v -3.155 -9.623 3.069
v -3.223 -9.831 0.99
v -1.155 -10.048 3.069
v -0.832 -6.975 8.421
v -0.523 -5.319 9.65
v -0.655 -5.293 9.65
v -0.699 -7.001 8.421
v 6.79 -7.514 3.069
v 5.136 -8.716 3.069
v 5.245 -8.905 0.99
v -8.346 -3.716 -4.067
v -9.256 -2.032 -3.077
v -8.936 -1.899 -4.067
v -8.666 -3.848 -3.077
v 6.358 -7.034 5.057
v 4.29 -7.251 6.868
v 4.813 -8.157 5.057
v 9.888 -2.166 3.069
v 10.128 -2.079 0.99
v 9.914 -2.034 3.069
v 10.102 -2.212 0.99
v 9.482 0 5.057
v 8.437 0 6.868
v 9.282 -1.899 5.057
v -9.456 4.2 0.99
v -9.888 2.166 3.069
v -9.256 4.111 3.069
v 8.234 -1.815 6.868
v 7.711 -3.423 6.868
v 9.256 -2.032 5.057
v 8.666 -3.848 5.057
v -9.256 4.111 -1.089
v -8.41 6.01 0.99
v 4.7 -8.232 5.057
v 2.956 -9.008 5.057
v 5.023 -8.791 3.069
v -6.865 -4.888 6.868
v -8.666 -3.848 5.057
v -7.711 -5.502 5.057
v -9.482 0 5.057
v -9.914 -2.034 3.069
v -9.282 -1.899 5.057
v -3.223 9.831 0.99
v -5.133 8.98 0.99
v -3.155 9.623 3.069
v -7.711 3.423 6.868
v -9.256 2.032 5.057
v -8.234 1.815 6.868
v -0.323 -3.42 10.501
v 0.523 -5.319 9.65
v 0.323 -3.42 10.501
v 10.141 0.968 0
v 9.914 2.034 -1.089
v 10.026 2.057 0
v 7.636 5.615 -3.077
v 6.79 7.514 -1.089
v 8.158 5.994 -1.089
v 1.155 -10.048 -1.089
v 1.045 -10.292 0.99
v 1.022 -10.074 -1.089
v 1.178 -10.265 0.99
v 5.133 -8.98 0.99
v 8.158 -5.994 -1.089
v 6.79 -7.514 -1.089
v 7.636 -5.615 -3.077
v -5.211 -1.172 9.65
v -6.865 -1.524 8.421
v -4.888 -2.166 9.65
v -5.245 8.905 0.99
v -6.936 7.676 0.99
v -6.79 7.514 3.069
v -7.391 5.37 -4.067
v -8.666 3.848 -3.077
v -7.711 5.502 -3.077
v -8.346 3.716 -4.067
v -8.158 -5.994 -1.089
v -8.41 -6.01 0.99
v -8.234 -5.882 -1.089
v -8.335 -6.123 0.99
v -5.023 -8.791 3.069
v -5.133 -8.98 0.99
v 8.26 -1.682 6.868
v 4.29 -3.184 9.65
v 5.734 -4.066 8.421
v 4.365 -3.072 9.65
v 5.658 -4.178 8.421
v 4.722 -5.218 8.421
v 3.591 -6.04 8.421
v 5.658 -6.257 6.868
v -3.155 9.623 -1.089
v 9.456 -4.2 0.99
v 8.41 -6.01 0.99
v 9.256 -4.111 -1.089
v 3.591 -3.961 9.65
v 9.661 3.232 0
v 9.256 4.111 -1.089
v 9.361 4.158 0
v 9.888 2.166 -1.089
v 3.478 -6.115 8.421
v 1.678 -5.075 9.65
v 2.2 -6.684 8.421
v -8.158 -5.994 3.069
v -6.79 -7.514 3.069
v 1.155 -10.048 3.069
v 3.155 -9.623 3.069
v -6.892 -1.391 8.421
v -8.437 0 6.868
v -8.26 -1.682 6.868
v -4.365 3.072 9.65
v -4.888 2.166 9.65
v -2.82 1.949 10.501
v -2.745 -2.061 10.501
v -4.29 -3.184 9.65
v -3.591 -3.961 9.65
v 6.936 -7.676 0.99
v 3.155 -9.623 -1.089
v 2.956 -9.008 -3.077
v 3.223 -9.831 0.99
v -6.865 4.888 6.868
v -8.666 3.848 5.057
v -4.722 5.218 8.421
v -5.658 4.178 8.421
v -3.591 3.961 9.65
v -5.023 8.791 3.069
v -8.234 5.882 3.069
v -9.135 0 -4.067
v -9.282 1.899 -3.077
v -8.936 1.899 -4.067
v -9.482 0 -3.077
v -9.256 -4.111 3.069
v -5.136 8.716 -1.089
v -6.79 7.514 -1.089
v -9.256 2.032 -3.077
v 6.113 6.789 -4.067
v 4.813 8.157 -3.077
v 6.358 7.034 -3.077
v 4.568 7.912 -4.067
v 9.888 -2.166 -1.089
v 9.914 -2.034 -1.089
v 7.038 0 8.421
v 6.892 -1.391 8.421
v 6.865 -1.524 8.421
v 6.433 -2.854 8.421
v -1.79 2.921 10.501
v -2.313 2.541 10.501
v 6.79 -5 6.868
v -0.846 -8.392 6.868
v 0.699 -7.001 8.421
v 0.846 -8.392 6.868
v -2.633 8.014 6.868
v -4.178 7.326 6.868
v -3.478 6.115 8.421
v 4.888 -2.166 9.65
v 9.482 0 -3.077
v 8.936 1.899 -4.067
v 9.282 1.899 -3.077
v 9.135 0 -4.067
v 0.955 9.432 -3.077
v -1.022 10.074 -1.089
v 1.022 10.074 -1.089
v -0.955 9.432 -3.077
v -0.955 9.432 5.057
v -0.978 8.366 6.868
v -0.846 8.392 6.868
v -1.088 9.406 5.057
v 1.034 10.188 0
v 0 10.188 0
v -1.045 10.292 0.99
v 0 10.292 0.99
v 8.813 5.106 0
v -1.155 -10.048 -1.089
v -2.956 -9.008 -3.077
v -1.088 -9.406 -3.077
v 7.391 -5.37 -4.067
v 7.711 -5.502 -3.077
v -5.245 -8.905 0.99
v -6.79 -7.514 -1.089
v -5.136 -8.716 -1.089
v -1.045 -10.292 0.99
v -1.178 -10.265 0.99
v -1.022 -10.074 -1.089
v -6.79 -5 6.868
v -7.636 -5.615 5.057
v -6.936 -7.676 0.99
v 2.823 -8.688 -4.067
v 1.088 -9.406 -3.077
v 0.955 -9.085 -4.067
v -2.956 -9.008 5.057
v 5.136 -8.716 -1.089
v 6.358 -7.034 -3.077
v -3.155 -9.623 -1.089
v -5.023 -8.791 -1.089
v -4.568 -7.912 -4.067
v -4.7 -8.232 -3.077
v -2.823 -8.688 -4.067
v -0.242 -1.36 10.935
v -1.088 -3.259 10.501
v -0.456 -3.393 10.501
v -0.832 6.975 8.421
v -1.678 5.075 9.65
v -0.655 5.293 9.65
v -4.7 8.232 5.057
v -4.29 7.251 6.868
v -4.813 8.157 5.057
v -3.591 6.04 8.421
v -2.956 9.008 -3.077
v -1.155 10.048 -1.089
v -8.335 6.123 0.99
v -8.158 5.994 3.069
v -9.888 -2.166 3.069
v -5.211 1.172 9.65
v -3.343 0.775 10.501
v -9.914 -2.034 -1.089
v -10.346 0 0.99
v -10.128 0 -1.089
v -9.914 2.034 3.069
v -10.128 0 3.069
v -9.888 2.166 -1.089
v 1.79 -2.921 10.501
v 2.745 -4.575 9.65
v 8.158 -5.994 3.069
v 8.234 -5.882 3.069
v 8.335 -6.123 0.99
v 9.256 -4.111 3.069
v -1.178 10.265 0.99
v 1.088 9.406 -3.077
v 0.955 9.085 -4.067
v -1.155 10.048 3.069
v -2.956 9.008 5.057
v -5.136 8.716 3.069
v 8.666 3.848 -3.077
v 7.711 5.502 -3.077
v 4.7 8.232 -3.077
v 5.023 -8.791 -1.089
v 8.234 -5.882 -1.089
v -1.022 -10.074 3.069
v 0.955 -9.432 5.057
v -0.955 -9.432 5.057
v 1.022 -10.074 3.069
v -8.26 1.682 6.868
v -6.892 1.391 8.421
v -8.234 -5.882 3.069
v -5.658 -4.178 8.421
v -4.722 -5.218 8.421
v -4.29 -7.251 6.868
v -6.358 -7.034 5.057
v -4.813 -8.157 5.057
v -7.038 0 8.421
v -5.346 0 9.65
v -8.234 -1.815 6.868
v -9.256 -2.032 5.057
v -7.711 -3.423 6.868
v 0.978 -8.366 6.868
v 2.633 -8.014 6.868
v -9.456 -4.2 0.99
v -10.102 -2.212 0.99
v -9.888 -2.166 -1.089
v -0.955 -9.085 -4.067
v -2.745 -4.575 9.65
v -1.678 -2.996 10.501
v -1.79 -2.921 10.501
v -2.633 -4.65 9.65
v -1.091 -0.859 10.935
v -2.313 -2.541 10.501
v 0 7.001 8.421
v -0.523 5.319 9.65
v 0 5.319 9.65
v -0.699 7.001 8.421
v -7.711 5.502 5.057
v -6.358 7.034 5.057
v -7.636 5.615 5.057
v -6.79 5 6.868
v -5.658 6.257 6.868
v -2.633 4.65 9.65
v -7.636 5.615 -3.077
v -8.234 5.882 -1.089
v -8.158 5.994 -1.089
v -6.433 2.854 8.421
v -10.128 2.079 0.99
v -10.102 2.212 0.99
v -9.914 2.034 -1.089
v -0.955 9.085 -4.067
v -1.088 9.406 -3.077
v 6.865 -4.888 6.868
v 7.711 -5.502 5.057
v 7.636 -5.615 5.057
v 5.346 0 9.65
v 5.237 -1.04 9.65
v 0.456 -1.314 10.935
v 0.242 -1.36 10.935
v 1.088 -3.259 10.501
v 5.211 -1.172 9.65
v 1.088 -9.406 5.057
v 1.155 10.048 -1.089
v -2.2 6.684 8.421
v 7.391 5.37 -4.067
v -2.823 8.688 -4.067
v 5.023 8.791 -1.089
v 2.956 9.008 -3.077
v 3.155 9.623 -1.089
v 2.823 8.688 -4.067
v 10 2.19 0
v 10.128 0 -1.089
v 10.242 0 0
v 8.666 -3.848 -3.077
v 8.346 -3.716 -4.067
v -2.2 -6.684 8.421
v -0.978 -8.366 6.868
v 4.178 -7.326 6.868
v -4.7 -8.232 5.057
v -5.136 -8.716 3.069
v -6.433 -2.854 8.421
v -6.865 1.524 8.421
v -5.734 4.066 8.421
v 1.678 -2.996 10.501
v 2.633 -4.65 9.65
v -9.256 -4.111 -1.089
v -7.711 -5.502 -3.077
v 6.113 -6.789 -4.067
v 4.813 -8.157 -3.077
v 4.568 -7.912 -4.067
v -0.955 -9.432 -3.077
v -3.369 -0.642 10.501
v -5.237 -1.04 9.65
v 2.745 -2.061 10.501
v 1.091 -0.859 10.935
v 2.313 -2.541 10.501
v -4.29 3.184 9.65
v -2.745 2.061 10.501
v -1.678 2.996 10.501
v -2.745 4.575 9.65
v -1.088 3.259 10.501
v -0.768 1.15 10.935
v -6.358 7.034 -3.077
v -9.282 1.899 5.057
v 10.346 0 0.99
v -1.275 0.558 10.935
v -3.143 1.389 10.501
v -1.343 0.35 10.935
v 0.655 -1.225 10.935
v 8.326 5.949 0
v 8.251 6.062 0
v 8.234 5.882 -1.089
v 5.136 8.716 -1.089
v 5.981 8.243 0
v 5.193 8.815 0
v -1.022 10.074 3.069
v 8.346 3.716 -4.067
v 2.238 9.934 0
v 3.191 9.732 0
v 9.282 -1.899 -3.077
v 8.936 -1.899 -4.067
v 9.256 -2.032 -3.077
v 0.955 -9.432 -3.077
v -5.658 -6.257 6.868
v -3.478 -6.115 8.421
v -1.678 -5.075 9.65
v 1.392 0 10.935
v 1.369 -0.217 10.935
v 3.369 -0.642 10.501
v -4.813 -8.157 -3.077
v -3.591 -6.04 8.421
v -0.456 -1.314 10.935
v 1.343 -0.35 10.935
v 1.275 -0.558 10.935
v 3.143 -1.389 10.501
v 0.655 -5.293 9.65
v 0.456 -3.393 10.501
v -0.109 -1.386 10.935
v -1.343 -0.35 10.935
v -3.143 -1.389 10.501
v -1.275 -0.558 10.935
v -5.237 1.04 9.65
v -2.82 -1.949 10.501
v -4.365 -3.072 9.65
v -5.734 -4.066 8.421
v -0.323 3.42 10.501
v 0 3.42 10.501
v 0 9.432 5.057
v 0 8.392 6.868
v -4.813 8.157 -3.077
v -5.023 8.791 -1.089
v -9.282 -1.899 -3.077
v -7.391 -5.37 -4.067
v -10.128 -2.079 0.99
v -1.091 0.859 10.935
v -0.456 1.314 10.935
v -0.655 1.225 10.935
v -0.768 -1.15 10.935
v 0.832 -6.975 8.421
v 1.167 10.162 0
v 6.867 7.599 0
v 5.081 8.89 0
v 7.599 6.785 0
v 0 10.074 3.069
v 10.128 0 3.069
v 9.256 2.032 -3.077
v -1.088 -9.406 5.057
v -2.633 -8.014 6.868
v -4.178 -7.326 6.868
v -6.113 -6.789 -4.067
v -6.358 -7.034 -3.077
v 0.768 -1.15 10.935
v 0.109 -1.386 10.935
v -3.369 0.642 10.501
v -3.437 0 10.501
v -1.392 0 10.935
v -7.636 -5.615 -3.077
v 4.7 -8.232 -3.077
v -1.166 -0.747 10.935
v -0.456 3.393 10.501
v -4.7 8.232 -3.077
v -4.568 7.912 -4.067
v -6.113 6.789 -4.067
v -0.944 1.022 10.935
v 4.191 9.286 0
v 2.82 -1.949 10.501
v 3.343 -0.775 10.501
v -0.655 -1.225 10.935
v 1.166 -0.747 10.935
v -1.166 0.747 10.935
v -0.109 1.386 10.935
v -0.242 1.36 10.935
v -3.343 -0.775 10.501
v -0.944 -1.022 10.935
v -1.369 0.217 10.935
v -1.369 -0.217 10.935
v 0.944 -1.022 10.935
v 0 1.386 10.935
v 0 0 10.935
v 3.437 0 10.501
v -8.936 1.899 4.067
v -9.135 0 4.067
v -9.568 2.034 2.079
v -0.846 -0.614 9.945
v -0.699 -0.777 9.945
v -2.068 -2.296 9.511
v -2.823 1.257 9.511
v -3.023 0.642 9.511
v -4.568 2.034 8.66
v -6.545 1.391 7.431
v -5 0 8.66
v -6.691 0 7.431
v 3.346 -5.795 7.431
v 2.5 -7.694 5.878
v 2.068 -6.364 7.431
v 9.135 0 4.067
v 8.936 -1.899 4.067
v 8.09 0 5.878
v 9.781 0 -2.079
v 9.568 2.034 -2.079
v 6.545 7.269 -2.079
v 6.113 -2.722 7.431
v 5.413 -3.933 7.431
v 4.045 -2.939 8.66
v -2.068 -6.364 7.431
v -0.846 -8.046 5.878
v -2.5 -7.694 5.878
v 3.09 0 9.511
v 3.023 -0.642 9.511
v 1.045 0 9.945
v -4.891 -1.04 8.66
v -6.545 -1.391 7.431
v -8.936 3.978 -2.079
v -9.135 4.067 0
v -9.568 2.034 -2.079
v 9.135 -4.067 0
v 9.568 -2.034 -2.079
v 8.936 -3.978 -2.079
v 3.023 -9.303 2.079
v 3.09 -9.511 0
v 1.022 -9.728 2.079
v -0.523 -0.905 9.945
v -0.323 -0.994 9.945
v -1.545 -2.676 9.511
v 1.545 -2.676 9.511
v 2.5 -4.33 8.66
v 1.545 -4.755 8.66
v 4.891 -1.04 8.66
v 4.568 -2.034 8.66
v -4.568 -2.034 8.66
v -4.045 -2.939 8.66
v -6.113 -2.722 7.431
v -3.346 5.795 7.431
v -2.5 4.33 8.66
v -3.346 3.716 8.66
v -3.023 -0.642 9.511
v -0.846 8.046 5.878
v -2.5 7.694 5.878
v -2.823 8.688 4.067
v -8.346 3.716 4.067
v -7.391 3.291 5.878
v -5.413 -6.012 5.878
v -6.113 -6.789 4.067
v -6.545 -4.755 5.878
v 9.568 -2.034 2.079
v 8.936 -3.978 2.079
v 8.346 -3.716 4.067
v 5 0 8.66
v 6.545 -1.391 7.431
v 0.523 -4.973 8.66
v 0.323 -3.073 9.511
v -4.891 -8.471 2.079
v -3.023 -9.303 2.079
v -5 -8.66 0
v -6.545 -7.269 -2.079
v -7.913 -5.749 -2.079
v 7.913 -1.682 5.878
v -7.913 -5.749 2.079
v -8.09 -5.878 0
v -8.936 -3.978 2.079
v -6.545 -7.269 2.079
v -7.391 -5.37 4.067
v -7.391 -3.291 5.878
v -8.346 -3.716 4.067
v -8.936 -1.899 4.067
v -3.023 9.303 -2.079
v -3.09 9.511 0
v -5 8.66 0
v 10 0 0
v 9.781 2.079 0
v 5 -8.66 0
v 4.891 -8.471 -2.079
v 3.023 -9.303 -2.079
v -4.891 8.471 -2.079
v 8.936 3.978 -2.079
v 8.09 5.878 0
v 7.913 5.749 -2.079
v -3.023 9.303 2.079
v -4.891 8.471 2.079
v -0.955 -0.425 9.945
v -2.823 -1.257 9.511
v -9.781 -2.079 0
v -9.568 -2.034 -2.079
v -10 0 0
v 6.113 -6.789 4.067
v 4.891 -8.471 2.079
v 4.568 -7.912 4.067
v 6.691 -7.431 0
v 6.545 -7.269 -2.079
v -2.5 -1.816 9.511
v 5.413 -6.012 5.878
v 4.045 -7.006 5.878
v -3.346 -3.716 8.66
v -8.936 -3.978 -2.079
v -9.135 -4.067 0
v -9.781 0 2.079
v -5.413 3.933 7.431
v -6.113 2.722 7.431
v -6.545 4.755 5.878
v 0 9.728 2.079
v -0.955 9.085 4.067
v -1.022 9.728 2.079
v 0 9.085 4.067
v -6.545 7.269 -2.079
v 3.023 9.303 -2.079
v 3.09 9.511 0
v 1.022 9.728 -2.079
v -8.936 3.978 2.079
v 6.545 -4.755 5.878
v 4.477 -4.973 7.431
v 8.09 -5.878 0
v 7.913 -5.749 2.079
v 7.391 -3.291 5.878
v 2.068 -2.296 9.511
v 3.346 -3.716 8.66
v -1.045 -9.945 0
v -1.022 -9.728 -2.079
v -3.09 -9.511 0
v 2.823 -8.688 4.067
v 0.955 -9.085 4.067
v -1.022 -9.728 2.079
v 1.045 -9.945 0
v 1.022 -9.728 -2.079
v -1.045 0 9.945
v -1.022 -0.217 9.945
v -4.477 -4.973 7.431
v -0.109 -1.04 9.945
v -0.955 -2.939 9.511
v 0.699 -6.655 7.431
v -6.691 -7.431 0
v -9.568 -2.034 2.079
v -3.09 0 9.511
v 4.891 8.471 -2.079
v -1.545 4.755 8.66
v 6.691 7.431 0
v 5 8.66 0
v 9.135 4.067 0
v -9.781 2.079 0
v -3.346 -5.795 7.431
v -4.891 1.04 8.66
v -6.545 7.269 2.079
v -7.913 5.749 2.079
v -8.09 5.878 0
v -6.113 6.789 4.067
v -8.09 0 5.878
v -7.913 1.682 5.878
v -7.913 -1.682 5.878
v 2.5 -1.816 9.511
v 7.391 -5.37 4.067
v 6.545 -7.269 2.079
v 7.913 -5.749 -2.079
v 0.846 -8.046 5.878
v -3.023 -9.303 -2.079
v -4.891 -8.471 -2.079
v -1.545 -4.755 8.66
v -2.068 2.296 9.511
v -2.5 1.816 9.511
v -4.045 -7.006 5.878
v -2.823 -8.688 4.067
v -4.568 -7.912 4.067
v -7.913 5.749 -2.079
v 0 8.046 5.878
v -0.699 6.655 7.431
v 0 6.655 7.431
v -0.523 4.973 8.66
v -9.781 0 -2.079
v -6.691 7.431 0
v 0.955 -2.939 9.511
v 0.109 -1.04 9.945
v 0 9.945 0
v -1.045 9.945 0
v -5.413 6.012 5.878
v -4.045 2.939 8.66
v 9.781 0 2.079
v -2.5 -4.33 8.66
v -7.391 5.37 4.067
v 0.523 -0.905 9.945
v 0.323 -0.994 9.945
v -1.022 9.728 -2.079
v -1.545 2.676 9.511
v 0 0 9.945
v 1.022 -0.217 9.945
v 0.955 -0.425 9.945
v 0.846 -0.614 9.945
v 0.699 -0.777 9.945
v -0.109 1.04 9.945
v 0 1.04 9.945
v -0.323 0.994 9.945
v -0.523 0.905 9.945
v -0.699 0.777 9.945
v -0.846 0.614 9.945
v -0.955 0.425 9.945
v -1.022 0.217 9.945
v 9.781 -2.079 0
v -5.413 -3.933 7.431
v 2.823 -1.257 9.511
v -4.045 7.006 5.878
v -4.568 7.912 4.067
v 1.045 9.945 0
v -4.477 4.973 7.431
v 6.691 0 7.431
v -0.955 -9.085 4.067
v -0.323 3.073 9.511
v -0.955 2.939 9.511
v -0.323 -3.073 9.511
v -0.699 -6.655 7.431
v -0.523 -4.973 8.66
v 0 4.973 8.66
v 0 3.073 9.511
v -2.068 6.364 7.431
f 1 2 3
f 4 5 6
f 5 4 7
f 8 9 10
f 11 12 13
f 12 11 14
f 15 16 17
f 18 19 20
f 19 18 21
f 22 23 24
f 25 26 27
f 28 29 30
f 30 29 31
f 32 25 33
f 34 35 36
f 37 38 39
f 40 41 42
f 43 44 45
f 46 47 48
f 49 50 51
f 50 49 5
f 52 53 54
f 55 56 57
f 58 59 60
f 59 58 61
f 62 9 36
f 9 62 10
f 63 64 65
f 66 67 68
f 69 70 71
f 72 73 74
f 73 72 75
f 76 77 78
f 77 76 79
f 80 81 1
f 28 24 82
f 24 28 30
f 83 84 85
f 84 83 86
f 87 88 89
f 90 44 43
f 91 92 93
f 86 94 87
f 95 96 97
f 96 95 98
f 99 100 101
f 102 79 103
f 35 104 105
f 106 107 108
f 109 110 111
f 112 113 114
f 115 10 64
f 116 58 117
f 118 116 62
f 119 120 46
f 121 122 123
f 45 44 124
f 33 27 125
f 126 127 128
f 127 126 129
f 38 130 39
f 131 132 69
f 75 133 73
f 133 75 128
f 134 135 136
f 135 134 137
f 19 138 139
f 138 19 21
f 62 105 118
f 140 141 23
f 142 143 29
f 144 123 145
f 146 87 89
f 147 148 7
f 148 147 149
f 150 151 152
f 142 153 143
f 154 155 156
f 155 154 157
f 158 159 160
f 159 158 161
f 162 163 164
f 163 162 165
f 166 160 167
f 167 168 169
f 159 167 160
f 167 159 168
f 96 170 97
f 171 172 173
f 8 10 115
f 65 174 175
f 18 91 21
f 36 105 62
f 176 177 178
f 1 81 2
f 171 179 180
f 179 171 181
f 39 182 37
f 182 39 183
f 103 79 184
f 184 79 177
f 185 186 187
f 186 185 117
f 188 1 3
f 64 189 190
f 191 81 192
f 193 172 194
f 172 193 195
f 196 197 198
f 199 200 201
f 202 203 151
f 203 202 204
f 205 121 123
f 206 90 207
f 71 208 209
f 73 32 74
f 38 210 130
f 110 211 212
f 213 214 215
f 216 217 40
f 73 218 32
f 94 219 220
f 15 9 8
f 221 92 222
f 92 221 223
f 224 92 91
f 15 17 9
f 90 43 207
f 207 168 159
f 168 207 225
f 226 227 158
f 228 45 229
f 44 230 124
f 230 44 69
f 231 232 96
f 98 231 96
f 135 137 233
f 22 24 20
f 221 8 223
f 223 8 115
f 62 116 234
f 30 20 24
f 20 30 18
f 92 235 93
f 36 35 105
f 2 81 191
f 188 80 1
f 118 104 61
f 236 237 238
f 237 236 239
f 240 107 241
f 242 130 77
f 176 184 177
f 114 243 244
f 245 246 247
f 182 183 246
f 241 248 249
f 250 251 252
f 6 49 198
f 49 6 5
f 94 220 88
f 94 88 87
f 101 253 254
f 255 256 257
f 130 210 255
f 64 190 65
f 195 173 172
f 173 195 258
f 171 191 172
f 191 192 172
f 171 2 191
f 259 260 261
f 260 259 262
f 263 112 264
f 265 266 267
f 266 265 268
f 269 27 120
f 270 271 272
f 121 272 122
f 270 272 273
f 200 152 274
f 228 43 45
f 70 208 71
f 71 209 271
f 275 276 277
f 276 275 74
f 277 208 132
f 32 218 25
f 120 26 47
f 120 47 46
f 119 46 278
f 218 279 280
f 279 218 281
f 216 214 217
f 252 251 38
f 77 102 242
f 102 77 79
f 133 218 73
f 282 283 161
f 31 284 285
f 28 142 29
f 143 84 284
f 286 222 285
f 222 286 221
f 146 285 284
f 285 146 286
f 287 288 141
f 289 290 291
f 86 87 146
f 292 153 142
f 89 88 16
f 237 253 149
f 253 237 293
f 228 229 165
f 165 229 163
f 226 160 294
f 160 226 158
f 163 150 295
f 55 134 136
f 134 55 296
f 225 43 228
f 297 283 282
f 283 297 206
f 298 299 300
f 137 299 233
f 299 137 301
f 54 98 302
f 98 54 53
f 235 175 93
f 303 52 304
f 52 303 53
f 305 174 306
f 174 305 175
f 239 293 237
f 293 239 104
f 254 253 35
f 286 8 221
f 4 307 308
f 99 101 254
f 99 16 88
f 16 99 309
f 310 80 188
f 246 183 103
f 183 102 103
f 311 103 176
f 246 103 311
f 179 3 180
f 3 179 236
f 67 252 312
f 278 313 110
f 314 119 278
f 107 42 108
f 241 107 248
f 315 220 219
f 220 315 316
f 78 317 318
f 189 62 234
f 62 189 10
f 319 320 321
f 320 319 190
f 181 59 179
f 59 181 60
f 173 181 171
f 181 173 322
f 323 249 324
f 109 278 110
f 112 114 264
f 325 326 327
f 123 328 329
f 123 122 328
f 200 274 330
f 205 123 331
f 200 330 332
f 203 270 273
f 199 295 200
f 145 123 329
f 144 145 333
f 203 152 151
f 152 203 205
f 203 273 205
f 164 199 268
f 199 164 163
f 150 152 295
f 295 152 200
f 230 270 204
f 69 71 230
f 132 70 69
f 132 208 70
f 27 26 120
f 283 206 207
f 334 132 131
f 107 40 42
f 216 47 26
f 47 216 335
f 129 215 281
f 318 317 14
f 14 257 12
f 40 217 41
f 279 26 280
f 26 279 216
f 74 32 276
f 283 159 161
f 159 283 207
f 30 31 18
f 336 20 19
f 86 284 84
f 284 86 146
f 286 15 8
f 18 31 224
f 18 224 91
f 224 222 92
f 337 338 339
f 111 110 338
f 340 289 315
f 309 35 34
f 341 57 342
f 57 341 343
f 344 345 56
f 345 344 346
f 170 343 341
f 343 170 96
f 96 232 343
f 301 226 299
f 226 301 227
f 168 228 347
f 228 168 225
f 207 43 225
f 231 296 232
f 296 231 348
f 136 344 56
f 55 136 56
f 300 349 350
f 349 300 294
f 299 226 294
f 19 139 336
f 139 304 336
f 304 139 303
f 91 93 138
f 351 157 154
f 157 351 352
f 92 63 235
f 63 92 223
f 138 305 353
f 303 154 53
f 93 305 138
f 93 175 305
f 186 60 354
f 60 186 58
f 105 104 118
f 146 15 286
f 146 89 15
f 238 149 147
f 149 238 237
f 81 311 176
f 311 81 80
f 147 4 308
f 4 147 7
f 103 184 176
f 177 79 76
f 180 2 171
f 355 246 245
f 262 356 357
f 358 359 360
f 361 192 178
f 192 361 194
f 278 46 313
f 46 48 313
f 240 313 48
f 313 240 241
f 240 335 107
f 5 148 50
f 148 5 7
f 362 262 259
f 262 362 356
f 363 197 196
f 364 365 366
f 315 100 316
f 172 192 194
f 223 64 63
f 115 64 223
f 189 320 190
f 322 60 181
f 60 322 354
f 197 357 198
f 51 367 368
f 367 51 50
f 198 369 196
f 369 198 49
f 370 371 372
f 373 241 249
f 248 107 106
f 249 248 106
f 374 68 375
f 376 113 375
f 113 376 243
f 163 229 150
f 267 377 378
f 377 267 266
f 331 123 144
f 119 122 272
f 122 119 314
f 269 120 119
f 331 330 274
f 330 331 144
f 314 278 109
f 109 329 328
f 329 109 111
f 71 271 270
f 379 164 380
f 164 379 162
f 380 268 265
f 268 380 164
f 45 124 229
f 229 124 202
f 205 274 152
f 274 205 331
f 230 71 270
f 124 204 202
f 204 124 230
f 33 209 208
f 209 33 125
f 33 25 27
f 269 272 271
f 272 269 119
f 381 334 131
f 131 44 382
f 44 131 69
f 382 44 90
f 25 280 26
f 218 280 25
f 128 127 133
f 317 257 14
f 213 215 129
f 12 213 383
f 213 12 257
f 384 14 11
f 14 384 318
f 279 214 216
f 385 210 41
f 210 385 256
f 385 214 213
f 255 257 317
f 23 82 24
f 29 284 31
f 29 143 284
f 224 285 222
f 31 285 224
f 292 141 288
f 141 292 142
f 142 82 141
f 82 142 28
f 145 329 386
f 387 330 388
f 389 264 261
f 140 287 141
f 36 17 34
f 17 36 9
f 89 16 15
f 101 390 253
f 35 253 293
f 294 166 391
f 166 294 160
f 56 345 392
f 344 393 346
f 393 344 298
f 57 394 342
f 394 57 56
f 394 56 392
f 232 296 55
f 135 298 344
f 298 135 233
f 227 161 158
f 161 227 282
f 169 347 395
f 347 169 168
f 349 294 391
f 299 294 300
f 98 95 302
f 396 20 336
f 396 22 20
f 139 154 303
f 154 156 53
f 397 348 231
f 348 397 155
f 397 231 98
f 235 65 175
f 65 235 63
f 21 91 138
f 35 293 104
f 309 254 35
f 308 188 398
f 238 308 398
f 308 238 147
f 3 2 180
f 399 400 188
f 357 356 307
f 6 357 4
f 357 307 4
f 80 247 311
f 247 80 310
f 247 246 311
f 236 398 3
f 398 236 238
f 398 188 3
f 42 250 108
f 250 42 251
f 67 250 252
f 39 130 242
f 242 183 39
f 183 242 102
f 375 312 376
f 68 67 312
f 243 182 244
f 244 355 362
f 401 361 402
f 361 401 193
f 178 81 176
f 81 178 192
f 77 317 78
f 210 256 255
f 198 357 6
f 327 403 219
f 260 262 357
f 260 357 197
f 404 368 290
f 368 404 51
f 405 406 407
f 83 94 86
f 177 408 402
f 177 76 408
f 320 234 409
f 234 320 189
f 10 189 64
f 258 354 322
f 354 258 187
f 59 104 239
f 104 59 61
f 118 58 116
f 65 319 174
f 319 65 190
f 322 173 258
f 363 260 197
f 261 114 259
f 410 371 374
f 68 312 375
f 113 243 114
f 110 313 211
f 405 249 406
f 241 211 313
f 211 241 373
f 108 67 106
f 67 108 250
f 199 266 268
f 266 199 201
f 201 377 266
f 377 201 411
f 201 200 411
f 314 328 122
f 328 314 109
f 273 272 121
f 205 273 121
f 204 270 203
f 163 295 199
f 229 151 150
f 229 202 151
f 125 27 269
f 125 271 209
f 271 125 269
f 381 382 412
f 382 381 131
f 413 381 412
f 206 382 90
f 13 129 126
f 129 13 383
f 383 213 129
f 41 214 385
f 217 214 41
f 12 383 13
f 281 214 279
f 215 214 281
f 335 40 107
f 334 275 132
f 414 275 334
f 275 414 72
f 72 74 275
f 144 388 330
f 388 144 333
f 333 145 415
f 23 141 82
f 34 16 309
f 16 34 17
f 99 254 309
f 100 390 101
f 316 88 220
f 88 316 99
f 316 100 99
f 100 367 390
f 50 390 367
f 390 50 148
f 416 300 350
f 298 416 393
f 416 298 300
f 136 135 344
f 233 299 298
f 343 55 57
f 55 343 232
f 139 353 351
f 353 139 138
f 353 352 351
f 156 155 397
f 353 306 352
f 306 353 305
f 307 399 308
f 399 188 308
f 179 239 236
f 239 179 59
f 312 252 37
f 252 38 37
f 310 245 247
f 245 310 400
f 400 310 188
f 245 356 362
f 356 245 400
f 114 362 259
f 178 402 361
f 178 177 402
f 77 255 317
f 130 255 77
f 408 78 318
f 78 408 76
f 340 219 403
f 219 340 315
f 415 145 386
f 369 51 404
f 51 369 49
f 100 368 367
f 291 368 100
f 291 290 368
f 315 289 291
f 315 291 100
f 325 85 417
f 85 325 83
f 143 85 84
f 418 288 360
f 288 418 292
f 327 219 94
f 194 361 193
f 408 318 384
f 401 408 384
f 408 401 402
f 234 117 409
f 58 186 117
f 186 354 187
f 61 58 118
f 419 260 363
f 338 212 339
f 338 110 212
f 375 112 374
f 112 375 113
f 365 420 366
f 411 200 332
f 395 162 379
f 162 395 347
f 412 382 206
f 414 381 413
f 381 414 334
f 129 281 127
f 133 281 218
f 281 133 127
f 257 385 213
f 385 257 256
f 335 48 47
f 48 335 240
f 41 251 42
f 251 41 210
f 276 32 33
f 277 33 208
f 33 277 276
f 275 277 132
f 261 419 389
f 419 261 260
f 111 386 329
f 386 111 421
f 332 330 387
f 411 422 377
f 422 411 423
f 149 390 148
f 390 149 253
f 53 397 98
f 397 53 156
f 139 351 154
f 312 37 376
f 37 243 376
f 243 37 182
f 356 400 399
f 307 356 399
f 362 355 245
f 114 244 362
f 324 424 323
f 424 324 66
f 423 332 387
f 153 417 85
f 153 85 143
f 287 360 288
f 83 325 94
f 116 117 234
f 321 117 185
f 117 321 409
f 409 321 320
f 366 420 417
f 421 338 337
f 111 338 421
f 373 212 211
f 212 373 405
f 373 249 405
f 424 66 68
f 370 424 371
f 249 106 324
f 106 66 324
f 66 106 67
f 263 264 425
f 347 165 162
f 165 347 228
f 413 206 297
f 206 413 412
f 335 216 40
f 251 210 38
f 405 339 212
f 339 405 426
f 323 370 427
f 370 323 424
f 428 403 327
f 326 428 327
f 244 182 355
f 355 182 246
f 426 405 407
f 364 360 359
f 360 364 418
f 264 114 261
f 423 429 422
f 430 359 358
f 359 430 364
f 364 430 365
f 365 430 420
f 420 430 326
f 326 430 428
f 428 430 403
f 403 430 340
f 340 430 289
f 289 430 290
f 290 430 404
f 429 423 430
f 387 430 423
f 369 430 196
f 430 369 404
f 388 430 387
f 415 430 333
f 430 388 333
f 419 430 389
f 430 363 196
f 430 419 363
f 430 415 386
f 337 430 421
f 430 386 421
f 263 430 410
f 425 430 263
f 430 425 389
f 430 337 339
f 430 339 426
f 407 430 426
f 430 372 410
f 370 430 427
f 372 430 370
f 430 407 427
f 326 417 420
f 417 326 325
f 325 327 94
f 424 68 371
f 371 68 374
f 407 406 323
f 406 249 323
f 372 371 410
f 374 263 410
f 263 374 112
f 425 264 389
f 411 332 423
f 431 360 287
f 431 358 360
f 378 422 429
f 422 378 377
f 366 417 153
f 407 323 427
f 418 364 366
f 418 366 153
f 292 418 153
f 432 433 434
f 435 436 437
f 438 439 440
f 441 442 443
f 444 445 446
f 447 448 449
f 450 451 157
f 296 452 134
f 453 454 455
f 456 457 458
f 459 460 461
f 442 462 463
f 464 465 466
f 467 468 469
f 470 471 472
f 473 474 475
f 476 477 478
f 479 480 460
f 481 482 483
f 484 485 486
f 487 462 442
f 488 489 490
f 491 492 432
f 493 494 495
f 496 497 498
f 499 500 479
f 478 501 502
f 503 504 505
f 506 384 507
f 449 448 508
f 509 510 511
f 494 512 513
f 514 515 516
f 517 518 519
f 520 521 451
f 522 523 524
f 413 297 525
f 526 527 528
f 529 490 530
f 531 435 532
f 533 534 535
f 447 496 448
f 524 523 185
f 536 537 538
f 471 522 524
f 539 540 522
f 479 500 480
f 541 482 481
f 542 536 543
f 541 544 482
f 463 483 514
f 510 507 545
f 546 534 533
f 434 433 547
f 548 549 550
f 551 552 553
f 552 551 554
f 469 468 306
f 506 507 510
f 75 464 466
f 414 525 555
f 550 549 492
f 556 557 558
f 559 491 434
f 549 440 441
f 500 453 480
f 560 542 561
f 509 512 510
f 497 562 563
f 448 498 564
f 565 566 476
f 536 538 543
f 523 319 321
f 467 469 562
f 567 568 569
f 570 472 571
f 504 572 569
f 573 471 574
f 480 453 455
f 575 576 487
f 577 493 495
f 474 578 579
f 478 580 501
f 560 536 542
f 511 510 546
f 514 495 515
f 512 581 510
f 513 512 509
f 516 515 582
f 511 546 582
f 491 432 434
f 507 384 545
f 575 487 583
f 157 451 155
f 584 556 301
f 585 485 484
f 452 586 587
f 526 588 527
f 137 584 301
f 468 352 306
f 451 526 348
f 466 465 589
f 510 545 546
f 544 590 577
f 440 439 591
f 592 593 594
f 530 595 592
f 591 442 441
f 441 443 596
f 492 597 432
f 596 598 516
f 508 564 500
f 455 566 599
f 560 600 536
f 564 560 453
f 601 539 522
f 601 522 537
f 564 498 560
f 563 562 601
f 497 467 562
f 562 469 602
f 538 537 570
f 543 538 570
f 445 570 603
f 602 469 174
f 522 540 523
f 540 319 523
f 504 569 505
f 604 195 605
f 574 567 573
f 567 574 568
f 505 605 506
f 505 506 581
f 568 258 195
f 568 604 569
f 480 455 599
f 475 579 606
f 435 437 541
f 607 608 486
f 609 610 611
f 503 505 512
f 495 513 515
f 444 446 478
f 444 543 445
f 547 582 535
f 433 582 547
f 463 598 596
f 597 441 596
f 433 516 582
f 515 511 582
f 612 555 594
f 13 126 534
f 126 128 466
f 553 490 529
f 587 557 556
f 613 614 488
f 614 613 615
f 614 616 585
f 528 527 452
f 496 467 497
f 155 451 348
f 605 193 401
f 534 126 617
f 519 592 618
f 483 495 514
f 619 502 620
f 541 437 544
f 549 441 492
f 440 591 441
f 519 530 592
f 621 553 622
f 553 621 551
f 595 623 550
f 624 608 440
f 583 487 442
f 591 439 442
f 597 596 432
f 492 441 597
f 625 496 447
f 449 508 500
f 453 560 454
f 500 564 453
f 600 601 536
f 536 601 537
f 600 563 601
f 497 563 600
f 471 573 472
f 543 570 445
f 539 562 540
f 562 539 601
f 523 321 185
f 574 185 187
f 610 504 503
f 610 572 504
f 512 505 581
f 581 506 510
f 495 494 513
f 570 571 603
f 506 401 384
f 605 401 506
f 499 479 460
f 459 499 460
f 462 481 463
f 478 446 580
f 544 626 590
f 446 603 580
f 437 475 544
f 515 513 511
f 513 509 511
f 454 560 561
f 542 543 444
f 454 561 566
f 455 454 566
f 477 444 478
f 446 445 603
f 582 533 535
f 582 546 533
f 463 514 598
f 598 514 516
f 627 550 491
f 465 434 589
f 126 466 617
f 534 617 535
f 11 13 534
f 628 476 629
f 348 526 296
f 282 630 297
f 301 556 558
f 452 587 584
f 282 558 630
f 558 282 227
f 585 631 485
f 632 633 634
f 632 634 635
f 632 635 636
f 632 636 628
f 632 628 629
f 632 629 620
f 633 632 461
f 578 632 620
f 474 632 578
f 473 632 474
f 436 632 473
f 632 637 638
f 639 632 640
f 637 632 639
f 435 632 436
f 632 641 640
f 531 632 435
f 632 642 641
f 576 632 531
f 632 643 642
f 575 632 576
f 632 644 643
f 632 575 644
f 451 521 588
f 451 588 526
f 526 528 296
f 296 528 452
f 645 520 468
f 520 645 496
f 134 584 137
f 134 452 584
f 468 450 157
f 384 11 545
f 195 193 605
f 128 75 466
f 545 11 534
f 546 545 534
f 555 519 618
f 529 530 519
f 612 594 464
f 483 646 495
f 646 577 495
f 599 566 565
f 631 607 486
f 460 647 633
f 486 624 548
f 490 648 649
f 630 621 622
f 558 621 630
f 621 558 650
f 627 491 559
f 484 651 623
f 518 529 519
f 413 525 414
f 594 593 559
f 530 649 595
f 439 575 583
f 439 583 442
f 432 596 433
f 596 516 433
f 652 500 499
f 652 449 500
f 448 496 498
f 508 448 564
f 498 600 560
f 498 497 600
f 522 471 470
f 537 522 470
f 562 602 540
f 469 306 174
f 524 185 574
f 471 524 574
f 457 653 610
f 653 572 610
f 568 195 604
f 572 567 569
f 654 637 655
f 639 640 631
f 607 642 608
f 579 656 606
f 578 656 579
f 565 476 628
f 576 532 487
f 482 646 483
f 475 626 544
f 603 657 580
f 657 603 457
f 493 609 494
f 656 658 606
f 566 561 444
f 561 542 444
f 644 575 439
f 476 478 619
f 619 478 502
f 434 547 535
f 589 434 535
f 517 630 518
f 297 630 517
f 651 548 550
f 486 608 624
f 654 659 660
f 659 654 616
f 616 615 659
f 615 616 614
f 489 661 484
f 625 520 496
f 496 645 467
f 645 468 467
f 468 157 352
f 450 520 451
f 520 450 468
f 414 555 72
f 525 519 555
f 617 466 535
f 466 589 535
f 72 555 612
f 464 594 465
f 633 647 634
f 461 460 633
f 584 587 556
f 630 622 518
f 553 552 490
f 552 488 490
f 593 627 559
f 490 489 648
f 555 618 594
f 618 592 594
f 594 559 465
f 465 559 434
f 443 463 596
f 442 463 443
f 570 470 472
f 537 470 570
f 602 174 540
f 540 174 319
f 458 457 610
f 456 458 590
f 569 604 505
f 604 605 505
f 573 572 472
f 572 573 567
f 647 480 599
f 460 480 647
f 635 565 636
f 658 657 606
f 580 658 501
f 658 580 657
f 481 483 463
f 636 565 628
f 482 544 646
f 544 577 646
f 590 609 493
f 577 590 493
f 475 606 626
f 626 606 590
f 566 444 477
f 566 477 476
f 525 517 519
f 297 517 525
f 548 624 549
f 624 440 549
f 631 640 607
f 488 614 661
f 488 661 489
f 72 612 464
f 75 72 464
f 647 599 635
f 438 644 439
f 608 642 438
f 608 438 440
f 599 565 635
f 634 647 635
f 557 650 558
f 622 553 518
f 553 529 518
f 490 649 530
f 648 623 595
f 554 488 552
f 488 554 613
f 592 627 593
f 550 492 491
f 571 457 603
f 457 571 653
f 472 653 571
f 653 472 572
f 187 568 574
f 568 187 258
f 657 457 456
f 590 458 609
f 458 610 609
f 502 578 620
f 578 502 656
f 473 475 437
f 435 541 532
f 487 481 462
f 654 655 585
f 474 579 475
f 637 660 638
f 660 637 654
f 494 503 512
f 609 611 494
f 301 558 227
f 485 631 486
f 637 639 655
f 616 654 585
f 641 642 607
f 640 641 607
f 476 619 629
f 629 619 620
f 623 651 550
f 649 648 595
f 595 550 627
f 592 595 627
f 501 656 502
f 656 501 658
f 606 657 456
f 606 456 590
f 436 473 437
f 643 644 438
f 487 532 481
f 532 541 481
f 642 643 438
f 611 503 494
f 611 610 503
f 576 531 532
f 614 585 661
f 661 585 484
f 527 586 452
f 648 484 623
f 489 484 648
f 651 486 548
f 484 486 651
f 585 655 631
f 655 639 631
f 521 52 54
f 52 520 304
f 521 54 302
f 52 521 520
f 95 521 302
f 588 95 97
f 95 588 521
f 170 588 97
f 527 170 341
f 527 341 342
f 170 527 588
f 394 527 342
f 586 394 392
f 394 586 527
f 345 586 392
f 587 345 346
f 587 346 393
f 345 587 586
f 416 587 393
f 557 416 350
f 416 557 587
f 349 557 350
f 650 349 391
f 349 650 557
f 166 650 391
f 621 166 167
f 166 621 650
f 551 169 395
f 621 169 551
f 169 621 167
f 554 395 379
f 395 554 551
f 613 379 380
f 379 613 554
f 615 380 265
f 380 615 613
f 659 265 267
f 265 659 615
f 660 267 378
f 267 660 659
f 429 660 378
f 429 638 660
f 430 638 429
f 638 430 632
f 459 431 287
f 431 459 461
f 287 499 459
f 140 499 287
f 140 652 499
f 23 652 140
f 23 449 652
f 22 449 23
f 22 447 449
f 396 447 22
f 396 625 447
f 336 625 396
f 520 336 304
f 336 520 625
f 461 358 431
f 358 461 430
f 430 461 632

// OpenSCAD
// Directed Minkowski Modules

render_test="test bulge_cube";
render_test="test bulge_cone";

module bulge_cube(h,scale_xy=0.1,theta=0,phi=0,dr=0) {
    intersection() {
        for(i=[0:1],j=[0:1]) {
            minkowski() {
                children();
                rotate([0,0,theta]) rotate([0,phi,0]) translate([0,0,dr])
                    mirror([i,j]) scale([scale_xy,scale_xy,h]) cube(1,center=false);
            }
        }
    }
}

if(render_test=="test bulge_cube") {
    %sphere(10);
    difference() {
        bulge_cube(2,0.001,theta=360*$t,phi=360*$t,dr=20*$t) sphere(10);
        sphere(10);
        cube(20,center=false);
    }
}

module bulge_cone(h,scale_xy=0.1,theta=0,phi=0,dr=0) {
    intersection() {
        minkowski() {
            children();
            rotate([0,0,theta]) rotate([0,phi,0]) translate([0,0,dr])  scale([scale_xy,scale_xy,h]) render()
                cylinder(r2=1,r1=0,h=1,center=false,$fn=16);
        }
    }
}

if(render_test=="test bulge_cone") {
    %sphere(10);
    difference() {
        bulge_cone(25*4*($t+0.01)*(1-$t-0.01),35*($t+0.01)*(1-$t-0.01),theta=360*$t,phi=360*$t,dr=15*4*$t*(1-$t)) sphere(10);
        sphere(10);
        cube(20,center=false);
    }
}
